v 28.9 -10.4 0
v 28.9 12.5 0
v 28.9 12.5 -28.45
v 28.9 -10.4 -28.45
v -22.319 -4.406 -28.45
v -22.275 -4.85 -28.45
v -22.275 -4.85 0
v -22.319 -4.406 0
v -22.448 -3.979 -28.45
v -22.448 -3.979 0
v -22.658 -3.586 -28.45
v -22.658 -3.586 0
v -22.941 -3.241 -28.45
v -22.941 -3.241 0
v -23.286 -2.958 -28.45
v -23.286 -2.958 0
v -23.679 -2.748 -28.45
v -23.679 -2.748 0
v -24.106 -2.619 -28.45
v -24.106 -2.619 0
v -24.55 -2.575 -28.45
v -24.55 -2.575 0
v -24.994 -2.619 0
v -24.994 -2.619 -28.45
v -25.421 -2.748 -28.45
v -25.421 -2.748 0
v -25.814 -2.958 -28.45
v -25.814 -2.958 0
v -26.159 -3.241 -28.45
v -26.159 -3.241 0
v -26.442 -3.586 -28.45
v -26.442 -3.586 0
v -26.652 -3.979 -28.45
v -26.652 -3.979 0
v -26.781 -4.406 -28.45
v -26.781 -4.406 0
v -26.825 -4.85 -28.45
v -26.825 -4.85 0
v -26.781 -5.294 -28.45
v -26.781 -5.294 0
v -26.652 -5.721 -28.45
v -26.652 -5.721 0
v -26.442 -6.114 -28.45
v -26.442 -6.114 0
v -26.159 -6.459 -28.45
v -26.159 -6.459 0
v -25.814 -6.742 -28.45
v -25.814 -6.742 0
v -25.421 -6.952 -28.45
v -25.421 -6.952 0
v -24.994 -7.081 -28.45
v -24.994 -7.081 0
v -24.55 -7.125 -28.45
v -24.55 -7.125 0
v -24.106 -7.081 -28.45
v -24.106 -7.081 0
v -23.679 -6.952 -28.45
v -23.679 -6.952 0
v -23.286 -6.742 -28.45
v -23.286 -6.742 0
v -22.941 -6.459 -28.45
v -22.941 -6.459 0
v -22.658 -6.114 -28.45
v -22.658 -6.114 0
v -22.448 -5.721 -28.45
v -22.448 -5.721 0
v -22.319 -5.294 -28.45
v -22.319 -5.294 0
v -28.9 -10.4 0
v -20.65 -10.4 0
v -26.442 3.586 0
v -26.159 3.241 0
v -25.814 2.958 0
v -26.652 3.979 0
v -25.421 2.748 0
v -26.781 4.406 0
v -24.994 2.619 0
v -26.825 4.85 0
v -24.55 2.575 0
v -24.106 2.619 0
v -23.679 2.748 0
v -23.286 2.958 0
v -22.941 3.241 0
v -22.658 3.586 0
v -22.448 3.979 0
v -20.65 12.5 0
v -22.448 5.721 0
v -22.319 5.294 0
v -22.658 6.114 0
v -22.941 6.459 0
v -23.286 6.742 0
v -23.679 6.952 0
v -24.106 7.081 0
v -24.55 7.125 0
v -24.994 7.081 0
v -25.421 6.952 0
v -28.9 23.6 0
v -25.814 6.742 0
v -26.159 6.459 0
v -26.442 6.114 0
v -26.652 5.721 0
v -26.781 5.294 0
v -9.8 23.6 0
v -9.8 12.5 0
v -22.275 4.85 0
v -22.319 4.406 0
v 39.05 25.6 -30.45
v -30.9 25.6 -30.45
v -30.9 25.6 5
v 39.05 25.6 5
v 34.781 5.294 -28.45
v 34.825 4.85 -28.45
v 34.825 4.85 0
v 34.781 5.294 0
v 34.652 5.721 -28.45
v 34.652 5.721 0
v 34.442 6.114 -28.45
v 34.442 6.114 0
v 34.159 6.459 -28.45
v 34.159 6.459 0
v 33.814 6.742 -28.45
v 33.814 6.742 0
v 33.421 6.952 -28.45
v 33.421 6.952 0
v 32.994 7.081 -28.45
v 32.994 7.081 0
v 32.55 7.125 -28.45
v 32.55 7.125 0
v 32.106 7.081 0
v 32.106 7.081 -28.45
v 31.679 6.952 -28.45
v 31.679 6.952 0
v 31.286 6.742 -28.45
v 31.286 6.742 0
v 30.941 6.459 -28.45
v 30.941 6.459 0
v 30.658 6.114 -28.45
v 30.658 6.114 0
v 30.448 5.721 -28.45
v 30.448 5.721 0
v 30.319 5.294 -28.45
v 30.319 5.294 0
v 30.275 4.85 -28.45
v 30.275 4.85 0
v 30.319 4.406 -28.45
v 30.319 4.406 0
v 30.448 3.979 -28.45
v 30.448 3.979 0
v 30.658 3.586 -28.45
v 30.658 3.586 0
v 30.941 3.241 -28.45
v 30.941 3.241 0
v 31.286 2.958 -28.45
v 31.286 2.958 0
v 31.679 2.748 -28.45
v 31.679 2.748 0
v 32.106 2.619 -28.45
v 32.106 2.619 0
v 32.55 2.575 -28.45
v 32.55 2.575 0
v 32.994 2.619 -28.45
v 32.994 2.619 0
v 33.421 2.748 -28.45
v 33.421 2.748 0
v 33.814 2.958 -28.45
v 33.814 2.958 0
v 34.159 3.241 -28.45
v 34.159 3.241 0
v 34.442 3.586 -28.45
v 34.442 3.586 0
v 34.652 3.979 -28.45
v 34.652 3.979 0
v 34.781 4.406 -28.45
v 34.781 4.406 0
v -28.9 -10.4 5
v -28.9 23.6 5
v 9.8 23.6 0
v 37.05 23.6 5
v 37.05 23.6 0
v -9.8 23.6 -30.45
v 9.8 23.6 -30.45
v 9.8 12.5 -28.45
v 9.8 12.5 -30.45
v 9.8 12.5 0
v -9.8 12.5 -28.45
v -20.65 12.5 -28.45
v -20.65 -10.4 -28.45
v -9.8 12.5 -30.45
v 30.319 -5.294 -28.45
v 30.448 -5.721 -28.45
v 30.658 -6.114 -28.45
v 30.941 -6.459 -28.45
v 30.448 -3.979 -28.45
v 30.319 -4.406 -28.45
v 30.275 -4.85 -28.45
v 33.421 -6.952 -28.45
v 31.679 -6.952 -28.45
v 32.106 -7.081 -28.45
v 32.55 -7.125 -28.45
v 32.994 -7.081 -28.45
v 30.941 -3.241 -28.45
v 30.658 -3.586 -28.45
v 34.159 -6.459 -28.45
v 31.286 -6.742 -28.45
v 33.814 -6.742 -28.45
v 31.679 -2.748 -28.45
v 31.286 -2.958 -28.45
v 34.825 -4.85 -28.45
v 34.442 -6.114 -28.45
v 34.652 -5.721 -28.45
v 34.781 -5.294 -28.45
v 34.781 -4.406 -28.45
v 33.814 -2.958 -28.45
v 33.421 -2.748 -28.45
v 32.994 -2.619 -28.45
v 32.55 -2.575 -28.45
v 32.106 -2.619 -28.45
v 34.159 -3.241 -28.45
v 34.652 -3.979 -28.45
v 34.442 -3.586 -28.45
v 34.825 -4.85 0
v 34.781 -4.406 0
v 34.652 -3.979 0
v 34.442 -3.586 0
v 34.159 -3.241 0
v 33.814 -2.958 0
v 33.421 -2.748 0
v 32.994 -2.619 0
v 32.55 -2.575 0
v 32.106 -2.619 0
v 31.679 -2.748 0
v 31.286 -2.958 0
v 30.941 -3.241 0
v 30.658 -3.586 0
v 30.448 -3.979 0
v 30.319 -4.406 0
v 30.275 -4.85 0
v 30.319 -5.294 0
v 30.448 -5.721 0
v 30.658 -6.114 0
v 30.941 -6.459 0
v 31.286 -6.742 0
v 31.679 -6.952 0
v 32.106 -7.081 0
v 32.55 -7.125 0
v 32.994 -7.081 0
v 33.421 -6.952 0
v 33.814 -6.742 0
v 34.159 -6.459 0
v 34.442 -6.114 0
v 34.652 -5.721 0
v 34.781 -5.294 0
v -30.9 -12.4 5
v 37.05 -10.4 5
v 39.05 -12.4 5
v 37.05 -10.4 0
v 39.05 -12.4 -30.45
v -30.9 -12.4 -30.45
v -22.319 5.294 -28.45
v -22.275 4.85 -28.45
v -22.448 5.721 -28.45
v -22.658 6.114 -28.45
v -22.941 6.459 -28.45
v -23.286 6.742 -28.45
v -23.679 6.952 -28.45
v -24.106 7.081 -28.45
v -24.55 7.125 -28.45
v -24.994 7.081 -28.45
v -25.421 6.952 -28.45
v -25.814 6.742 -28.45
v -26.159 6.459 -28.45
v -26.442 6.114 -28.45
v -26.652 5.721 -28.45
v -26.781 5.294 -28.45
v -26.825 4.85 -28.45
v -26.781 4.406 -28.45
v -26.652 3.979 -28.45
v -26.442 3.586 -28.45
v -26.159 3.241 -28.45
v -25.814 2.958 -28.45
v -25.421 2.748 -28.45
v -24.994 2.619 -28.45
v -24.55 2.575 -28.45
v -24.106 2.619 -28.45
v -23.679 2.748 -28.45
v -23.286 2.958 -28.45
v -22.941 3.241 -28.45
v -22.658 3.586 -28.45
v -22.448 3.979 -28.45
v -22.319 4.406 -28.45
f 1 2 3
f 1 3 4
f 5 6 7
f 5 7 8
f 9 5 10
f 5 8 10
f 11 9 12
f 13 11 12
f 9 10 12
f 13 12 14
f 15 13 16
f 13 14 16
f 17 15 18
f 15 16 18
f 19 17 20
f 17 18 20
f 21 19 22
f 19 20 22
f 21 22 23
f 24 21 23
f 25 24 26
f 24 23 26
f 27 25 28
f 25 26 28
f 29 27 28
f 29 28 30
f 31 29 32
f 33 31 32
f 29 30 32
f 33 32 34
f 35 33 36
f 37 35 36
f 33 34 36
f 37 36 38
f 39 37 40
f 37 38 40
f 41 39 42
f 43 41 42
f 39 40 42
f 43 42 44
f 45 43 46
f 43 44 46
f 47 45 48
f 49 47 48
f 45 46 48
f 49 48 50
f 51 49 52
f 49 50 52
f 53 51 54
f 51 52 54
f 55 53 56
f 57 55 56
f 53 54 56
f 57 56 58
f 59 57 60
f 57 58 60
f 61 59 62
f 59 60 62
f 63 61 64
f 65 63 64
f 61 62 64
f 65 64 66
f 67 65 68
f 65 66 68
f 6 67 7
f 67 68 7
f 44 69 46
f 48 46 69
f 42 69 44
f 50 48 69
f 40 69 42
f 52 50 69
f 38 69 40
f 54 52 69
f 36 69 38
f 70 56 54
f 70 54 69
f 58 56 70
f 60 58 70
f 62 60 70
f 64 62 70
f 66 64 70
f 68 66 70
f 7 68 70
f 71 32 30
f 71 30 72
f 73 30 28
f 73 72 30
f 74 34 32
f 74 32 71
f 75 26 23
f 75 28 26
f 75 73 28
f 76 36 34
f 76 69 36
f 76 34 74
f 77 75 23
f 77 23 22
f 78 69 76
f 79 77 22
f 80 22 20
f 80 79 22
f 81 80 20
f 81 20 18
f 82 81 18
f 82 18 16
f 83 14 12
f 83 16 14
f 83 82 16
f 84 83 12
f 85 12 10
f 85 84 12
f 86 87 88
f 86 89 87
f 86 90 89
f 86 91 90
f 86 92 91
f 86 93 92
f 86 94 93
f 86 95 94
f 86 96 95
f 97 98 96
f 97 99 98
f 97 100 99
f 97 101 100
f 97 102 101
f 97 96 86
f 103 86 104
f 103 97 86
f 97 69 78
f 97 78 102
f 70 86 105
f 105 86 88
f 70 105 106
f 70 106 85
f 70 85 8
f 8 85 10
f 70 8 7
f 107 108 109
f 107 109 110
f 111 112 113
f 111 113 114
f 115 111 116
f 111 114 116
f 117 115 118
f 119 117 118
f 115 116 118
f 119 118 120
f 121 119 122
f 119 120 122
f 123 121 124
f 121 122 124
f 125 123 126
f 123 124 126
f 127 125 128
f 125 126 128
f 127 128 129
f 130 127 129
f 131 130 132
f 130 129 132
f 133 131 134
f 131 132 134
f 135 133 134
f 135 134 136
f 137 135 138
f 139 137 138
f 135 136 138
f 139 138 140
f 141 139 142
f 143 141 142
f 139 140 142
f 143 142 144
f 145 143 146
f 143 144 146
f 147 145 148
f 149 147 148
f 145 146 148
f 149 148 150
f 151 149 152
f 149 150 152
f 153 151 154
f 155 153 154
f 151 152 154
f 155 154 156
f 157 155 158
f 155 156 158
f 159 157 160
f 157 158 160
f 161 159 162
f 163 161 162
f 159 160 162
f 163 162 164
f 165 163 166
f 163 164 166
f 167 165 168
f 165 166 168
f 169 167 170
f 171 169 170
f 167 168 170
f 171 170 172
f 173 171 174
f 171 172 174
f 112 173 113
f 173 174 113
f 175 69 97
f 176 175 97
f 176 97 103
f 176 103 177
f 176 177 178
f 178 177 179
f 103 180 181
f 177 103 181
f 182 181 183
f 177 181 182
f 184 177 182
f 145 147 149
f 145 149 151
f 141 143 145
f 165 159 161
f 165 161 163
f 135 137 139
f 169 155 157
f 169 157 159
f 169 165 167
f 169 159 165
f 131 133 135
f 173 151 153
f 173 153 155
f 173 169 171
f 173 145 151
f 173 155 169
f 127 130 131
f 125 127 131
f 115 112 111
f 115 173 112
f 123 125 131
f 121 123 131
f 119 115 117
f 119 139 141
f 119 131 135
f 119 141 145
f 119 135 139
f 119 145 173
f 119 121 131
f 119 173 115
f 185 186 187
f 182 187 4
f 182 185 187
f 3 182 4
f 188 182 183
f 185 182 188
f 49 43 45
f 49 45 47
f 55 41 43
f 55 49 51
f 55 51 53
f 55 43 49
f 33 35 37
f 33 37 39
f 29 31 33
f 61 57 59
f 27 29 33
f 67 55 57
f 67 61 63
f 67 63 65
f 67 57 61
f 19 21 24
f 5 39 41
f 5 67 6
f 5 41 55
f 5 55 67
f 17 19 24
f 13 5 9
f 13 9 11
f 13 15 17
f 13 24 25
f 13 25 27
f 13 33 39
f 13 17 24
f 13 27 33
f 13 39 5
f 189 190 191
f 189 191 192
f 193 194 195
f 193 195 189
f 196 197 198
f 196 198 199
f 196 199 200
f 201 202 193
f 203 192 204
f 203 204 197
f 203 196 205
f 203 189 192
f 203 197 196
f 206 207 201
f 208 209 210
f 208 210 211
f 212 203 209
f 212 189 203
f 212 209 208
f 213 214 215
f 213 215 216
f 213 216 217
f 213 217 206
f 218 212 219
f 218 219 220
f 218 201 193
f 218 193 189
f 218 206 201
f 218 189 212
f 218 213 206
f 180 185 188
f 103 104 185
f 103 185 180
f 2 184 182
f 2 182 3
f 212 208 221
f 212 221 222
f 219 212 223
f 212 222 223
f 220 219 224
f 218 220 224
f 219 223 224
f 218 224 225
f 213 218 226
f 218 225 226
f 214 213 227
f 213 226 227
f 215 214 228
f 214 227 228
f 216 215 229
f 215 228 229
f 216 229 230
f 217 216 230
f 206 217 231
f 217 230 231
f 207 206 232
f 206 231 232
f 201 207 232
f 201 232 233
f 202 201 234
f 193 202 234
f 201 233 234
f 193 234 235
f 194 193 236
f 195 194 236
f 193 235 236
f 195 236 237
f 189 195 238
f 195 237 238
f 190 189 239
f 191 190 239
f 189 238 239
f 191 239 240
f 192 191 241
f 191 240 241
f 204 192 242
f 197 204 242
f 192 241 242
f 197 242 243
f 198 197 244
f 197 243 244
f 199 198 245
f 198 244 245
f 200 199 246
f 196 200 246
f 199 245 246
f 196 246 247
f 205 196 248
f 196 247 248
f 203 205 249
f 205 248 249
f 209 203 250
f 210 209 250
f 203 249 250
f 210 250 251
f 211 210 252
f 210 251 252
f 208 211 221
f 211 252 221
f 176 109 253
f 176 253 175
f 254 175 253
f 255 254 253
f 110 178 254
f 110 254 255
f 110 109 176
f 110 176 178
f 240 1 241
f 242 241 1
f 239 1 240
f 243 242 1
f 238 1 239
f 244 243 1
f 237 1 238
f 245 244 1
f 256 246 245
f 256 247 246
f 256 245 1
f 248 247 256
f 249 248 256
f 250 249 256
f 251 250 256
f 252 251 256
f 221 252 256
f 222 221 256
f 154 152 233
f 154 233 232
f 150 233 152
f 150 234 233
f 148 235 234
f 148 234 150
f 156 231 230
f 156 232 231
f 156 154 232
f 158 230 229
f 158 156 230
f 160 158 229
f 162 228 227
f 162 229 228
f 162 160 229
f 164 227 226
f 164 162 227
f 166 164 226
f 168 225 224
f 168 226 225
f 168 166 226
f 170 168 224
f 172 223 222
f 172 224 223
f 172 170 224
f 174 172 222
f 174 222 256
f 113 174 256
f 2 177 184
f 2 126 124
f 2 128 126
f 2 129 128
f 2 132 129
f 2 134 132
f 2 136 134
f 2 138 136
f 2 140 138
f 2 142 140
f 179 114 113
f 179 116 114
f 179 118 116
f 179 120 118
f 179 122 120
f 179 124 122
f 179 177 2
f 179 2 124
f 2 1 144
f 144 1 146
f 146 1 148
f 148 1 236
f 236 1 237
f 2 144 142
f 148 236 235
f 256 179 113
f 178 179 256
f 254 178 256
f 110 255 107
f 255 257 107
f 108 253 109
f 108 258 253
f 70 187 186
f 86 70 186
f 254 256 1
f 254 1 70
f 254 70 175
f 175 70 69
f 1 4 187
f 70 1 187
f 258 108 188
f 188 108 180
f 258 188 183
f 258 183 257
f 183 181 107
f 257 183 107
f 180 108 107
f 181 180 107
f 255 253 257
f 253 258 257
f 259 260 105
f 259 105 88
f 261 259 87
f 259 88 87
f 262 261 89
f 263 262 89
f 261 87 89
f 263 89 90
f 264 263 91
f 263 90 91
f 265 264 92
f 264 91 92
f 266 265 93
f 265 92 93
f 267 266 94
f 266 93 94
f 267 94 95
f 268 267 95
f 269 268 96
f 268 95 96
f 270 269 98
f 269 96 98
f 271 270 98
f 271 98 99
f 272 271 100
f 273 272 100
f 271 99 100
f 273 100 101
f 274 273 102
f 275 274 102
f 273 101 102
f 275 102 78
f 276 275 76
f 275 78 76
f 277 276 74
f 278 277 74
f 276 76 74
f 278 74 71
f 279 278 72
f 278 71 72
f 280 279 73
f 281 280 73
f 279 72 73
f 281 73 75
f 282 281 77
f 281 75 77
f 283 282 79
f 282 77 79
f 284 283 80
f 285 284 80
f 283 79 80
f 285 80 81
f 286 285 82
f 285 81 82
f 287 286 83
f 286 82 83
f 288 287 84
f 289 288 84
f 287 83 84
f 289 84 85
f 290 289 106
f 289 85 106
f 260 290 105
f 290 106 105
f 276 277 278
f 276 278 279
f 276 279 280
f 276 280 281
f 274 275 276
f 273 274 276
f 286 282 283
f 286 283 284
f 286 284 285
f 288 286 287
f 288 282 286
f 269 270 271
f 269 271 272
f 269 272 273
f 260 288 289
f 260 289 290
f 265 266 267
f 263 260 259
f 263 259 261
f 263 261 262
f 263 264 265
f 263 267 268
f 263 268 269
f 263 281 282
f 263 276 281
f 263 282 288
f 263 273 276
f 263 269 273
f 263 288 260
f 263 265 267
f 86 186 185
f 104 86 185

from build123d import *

# Parameters (mm, degrees)
SKETCH1_W           = 8.25
SKETCH1_H           = 2.1
SKETCH1_H_2         = 20.8
SKETCH1_R           = 2.275
BOSS_EXTRUDE1_DEPTH = 28.45
BOSS_EXTRUDE2_START = -28.45
SKETCH1_4_W         = 8.25
SKETCH1_4_H         = 2.1
SKETCH1_4_H_2       = 20.8
SKETCH1_4_R         = 2.275
SKETCH1_4_W_2       = 40.9
SKETCH1_4_W_3       = 0.2
SKETCH1_4_W_4       = 8.45
SKETCH1_4_R_2       = 1.7
BOSS_EXTRUDE2_DEPTH = 2
SKETCH1_5_W         = 69.95
SKETCH1_5_H         = 38
BOSS_EXTRUDE3_DEPTH = 30.45
SKETCH1_6_W         = 69.95
SKETCH1_6_H         = 38
BOSS_EXTRUDE4_DEPTH = 5


with BuildPart() as part:
    # Sketch1 → Boss-Extrude1 (new body)
    # profile 1 of 5: a face of its own
    with BuildSketch(Plane.XY):
        Polygon((-28.9, 12.5), (-20.65, 12.5), (-9.8, 12.5), (-9.8, 23.6), (-28.9, 23.6), align=None)
    # profile 2 of 5: a face of its own
    with BuildSketch(Plane.XY):
        with Locations((-24.775, 11.45)):
            Rectangle(SKETCH1_W, SKETCH1_H)
    # profile 3 of 5: a face of its own
    with BuildSketch(Plane.XY):
        with Locations((-24.775, 0)):
            Rectangle(SKETCH1_W, SKETCH1_H_2)
        with Locations((-24.55, -4.85)):
            Circle(SKETCH1_R, mode=Mode.SUBTRACT)
        with Locations((-24.55, 4.85)):
            Circle(SKETCH1_R, mode=Mode.SUBTRACT)
    # profile 4 of 5: a face of its own
    with BuildSketch(Plane.XY):
        Polygon((9.8, 12.5), (20.45, 12.5), (28.9, 12.5), (37.05, 12.5), (37.05, 23.6), (9.8, 23.6), align=None)
    # profile 5 of 5: a face of its own
    with BuildSketch(Plane.XY):
        Polygon((28.9, 12.5), (28.9, 10.4), (28.9, -10.4), (37.05, -10.4), (37.05, 12.5), align=None)
        with Locations((32.55, -4.85)):
            Circle(SKETCH1_R, mode=Mode.SUBTRACT)
        with Locations((32.55, 4.85)):
            Circle(SKETCH1_R, mode=Mode.SUBTRACT)
    extrude(amount=-BOSS_EXTRUDE1_DEPTH)

    # Sketch1<4> → Boss-Extrude2 (add)
    # profile 1 of 16: a face of its own
    with BuildSketch(Plane.XY.offset(BOSS_EXTRUDE2_START)):
        Polygon((-28.9, 12.5), (-20.65, 12.5), (-9.8, 12.5), (-9.8, 23.6), (-28.9, 23.6), align=None)
    # profile 2 of 16: a face of its own
    with BuildSketch(Plane.XY.offset(BOSS_EXTRUDE2_START)):
        Polygon((9.8, 12.5), (20.45, 12.5), (28.9, 12.5), (37.05, 12.5), (37.05, 23.6), (9.8, 23.6), align=None)
    # profile 3 of 16: a face of its own
    with BuildSketch(Plane.XY.offset(BOSS_EXTRUDE2_START)):
        Polygon((-20.65, 10.4), (-20.45, 10.4), (20.45, 10.4), (20.45, 12.5), (9.8, 12.5), (-9.8, 12.5), (-20.65, 12.5), align=None)
    # profile 4 of 16: a face of its own
    with BuildSketch(Plane.XY.offset(BOSS_EXTRUDE2_START)):
        with Locations((-24.775, 11.45)):
            Rectangle(SKETCH1_4_W, SKETCH1_4_H)
    # profile 5 of 16: a face of its own
    with BuildSketch(Plane.XY.offset(BOSS_EXTRUDE2_START)):
        with Locations((-24.775, 0)):
            Rectangle(SKETCH1_4_W, SKETCH1_4_H_2)
        with Locations((-24.55, -4.85)):
            Circle(SKETCH1_4_R, mode=Mode.SUBTRACT)
        with Locations((-24.55, 4.85)):
            Circle(SKETCH1_4_R, mode=Mode.SUBTRACT)
    # profile 6 of 16: a face of its own
    with BuildSketch(Plane.XY.offset(BOSS_EXTRUDE2_START)):
        with Locations((-24.55, 4.85)):
            Circle(SKETCH1_4_R)
    # profile 7 of 16: a face of its own
    with BuildSketch(Plane.XY.offset(BOSS_EXTRUDE2_START)):
        with Locations((-24.55, -4.85)):
            Circle(SKETCH1_4_R)
    # profile 8 of 16: a face of its own
    with BuildSketch(Plane.XY.offset(BOSS_EXTRUDE2_START)):
        Rectangle(SKETCH1_4_W_2, SKETCH1_4_H_2)
    # profile 9 of 16: a face of its own
    with BuildSketch(Plane.XY.offset(BOSS_EXTRUDE2_START)):
        with Locations((-20.55, 0)):
            Rectangle(SKETCH1_4_W_3, SKETCH1_4_H_2)
    # profile 10 of 16: a face of its own
    with BuildSketch(Plane.XY.offset(BOSS_EXTRUDE2_START)):
        with Locations((24.675, 0)):
            Rectangle(SKETCH1_4_W_4, SKETCH1_4_H_2)
        with Locations((24.55, -4.85)):
            Circle(SKETCH1_4_R_2, mode=Mode.SUBTRACT)
        with Locations((24.55, 4.85)):
            Circle(SKETCH1_4_R_2, mode=Mode.SUBTRACT)
    # profile 11 of 16: a face of its own
    with BuildSketch(Plane.XY.offset(BOSS_EXTRUDE2_START)):
        with Locations((24.55, 4.85)):
            Circle(SKETCH1_4_R_2)
    # profile 12 of 16: a face of its own
    with BuildSketch(Plane.XY.offset(BOSS_EXTRUDE2_START)):
        with Locations((24.55, -4.85)):
            Circle(SKETCH1_4_R_2)
    # profile 13 of 16: a face of its own
    with BuildSketch(Plane.XY.offset(BOSS_EXTRUDE2_START)):
        with Locations((24.675, 11.45)):
            Rectangle(SKETCH1_4_W_4, SKETCH1_4_H)
    # profile 14 of 16: a face of its own
    with BuildSketch(Plane.XY.offset(BOSS_EXTRUDE2_START)):
        Polygon((28.9, 12.5), (28.9, 10.4), (28.9, -10.4), (37.05, -10.4), (37.05, 12.5), align=None)
        with Locations((32.55, -4.85)):
            Circle(SKETCH1_4_R, mode=Mode.SUBTRACT)
        with Locations((32.55, 4.85)):
            Circle(SKETCH1_4_R, mode=Mode.SUBTRACT)
    # profile 15 of 16: a face of its own
    with BuildSketch(Plane.XY.offset(BOSS_EXTRUDE2_START)):
        with Locations((32.55, 4.85)):
            Circle(SKETCH1_4_R)
    # profile 16 of 16: a face of its own
    with BuildSketch(Plane.XY.offset(BOSS_EXTRUDE2_START)):
        with Locations((32.55, -4.85)):
            Circle(SKETCH1_4_R)
    extrude(amount=-BOSS_EXTRUDE2_DEPTH)

    # Sketch1<5> → Boss-Extrude3 (add)
    with BuildSketch(Plane.XY):
        with Locations((4.075, 6.6)):
            Rectangle(SKETCH1_5_W, SKETCH1_5_H)
        Polygon((37.05, 23.6), (9.8, 23.6), (-9.8, 23.6), (-28.9, 23.6), (-28.9, 12.5), (-28.9, 10.4), (-28.9, -10.4), (28.9, -10.4), (37.05, -10.4), (37.05, 12.5), align=None, mode=Mode.SUBTRACT)
    extrude(amount=-BOSS_EXTRUDE3_DEPTH)

    # Sketch1<6> → Boss-Extrude4 (add)
    with BuildSketch(Plane.XY):
        with Locations((4.075, 6.6)):
            Rectangle(SKETCH1_6_W, SKETCH1_6_H)
        Polygon((37.05, 23.6), (9.8, 23.6), (-9.8, 23.6), (-28.9, 23.6), (-28.9, 12.5), (-28.9, 10.4), (-28.9, -10.4), (28.9, -10.4), (37.05, -10.4), (37.05, 12.5), align=None, mode=Mode.SUBTRACT)
    extrude(amount=BOSS_EXTRUDE4_DEPTH)


solid = part.part
